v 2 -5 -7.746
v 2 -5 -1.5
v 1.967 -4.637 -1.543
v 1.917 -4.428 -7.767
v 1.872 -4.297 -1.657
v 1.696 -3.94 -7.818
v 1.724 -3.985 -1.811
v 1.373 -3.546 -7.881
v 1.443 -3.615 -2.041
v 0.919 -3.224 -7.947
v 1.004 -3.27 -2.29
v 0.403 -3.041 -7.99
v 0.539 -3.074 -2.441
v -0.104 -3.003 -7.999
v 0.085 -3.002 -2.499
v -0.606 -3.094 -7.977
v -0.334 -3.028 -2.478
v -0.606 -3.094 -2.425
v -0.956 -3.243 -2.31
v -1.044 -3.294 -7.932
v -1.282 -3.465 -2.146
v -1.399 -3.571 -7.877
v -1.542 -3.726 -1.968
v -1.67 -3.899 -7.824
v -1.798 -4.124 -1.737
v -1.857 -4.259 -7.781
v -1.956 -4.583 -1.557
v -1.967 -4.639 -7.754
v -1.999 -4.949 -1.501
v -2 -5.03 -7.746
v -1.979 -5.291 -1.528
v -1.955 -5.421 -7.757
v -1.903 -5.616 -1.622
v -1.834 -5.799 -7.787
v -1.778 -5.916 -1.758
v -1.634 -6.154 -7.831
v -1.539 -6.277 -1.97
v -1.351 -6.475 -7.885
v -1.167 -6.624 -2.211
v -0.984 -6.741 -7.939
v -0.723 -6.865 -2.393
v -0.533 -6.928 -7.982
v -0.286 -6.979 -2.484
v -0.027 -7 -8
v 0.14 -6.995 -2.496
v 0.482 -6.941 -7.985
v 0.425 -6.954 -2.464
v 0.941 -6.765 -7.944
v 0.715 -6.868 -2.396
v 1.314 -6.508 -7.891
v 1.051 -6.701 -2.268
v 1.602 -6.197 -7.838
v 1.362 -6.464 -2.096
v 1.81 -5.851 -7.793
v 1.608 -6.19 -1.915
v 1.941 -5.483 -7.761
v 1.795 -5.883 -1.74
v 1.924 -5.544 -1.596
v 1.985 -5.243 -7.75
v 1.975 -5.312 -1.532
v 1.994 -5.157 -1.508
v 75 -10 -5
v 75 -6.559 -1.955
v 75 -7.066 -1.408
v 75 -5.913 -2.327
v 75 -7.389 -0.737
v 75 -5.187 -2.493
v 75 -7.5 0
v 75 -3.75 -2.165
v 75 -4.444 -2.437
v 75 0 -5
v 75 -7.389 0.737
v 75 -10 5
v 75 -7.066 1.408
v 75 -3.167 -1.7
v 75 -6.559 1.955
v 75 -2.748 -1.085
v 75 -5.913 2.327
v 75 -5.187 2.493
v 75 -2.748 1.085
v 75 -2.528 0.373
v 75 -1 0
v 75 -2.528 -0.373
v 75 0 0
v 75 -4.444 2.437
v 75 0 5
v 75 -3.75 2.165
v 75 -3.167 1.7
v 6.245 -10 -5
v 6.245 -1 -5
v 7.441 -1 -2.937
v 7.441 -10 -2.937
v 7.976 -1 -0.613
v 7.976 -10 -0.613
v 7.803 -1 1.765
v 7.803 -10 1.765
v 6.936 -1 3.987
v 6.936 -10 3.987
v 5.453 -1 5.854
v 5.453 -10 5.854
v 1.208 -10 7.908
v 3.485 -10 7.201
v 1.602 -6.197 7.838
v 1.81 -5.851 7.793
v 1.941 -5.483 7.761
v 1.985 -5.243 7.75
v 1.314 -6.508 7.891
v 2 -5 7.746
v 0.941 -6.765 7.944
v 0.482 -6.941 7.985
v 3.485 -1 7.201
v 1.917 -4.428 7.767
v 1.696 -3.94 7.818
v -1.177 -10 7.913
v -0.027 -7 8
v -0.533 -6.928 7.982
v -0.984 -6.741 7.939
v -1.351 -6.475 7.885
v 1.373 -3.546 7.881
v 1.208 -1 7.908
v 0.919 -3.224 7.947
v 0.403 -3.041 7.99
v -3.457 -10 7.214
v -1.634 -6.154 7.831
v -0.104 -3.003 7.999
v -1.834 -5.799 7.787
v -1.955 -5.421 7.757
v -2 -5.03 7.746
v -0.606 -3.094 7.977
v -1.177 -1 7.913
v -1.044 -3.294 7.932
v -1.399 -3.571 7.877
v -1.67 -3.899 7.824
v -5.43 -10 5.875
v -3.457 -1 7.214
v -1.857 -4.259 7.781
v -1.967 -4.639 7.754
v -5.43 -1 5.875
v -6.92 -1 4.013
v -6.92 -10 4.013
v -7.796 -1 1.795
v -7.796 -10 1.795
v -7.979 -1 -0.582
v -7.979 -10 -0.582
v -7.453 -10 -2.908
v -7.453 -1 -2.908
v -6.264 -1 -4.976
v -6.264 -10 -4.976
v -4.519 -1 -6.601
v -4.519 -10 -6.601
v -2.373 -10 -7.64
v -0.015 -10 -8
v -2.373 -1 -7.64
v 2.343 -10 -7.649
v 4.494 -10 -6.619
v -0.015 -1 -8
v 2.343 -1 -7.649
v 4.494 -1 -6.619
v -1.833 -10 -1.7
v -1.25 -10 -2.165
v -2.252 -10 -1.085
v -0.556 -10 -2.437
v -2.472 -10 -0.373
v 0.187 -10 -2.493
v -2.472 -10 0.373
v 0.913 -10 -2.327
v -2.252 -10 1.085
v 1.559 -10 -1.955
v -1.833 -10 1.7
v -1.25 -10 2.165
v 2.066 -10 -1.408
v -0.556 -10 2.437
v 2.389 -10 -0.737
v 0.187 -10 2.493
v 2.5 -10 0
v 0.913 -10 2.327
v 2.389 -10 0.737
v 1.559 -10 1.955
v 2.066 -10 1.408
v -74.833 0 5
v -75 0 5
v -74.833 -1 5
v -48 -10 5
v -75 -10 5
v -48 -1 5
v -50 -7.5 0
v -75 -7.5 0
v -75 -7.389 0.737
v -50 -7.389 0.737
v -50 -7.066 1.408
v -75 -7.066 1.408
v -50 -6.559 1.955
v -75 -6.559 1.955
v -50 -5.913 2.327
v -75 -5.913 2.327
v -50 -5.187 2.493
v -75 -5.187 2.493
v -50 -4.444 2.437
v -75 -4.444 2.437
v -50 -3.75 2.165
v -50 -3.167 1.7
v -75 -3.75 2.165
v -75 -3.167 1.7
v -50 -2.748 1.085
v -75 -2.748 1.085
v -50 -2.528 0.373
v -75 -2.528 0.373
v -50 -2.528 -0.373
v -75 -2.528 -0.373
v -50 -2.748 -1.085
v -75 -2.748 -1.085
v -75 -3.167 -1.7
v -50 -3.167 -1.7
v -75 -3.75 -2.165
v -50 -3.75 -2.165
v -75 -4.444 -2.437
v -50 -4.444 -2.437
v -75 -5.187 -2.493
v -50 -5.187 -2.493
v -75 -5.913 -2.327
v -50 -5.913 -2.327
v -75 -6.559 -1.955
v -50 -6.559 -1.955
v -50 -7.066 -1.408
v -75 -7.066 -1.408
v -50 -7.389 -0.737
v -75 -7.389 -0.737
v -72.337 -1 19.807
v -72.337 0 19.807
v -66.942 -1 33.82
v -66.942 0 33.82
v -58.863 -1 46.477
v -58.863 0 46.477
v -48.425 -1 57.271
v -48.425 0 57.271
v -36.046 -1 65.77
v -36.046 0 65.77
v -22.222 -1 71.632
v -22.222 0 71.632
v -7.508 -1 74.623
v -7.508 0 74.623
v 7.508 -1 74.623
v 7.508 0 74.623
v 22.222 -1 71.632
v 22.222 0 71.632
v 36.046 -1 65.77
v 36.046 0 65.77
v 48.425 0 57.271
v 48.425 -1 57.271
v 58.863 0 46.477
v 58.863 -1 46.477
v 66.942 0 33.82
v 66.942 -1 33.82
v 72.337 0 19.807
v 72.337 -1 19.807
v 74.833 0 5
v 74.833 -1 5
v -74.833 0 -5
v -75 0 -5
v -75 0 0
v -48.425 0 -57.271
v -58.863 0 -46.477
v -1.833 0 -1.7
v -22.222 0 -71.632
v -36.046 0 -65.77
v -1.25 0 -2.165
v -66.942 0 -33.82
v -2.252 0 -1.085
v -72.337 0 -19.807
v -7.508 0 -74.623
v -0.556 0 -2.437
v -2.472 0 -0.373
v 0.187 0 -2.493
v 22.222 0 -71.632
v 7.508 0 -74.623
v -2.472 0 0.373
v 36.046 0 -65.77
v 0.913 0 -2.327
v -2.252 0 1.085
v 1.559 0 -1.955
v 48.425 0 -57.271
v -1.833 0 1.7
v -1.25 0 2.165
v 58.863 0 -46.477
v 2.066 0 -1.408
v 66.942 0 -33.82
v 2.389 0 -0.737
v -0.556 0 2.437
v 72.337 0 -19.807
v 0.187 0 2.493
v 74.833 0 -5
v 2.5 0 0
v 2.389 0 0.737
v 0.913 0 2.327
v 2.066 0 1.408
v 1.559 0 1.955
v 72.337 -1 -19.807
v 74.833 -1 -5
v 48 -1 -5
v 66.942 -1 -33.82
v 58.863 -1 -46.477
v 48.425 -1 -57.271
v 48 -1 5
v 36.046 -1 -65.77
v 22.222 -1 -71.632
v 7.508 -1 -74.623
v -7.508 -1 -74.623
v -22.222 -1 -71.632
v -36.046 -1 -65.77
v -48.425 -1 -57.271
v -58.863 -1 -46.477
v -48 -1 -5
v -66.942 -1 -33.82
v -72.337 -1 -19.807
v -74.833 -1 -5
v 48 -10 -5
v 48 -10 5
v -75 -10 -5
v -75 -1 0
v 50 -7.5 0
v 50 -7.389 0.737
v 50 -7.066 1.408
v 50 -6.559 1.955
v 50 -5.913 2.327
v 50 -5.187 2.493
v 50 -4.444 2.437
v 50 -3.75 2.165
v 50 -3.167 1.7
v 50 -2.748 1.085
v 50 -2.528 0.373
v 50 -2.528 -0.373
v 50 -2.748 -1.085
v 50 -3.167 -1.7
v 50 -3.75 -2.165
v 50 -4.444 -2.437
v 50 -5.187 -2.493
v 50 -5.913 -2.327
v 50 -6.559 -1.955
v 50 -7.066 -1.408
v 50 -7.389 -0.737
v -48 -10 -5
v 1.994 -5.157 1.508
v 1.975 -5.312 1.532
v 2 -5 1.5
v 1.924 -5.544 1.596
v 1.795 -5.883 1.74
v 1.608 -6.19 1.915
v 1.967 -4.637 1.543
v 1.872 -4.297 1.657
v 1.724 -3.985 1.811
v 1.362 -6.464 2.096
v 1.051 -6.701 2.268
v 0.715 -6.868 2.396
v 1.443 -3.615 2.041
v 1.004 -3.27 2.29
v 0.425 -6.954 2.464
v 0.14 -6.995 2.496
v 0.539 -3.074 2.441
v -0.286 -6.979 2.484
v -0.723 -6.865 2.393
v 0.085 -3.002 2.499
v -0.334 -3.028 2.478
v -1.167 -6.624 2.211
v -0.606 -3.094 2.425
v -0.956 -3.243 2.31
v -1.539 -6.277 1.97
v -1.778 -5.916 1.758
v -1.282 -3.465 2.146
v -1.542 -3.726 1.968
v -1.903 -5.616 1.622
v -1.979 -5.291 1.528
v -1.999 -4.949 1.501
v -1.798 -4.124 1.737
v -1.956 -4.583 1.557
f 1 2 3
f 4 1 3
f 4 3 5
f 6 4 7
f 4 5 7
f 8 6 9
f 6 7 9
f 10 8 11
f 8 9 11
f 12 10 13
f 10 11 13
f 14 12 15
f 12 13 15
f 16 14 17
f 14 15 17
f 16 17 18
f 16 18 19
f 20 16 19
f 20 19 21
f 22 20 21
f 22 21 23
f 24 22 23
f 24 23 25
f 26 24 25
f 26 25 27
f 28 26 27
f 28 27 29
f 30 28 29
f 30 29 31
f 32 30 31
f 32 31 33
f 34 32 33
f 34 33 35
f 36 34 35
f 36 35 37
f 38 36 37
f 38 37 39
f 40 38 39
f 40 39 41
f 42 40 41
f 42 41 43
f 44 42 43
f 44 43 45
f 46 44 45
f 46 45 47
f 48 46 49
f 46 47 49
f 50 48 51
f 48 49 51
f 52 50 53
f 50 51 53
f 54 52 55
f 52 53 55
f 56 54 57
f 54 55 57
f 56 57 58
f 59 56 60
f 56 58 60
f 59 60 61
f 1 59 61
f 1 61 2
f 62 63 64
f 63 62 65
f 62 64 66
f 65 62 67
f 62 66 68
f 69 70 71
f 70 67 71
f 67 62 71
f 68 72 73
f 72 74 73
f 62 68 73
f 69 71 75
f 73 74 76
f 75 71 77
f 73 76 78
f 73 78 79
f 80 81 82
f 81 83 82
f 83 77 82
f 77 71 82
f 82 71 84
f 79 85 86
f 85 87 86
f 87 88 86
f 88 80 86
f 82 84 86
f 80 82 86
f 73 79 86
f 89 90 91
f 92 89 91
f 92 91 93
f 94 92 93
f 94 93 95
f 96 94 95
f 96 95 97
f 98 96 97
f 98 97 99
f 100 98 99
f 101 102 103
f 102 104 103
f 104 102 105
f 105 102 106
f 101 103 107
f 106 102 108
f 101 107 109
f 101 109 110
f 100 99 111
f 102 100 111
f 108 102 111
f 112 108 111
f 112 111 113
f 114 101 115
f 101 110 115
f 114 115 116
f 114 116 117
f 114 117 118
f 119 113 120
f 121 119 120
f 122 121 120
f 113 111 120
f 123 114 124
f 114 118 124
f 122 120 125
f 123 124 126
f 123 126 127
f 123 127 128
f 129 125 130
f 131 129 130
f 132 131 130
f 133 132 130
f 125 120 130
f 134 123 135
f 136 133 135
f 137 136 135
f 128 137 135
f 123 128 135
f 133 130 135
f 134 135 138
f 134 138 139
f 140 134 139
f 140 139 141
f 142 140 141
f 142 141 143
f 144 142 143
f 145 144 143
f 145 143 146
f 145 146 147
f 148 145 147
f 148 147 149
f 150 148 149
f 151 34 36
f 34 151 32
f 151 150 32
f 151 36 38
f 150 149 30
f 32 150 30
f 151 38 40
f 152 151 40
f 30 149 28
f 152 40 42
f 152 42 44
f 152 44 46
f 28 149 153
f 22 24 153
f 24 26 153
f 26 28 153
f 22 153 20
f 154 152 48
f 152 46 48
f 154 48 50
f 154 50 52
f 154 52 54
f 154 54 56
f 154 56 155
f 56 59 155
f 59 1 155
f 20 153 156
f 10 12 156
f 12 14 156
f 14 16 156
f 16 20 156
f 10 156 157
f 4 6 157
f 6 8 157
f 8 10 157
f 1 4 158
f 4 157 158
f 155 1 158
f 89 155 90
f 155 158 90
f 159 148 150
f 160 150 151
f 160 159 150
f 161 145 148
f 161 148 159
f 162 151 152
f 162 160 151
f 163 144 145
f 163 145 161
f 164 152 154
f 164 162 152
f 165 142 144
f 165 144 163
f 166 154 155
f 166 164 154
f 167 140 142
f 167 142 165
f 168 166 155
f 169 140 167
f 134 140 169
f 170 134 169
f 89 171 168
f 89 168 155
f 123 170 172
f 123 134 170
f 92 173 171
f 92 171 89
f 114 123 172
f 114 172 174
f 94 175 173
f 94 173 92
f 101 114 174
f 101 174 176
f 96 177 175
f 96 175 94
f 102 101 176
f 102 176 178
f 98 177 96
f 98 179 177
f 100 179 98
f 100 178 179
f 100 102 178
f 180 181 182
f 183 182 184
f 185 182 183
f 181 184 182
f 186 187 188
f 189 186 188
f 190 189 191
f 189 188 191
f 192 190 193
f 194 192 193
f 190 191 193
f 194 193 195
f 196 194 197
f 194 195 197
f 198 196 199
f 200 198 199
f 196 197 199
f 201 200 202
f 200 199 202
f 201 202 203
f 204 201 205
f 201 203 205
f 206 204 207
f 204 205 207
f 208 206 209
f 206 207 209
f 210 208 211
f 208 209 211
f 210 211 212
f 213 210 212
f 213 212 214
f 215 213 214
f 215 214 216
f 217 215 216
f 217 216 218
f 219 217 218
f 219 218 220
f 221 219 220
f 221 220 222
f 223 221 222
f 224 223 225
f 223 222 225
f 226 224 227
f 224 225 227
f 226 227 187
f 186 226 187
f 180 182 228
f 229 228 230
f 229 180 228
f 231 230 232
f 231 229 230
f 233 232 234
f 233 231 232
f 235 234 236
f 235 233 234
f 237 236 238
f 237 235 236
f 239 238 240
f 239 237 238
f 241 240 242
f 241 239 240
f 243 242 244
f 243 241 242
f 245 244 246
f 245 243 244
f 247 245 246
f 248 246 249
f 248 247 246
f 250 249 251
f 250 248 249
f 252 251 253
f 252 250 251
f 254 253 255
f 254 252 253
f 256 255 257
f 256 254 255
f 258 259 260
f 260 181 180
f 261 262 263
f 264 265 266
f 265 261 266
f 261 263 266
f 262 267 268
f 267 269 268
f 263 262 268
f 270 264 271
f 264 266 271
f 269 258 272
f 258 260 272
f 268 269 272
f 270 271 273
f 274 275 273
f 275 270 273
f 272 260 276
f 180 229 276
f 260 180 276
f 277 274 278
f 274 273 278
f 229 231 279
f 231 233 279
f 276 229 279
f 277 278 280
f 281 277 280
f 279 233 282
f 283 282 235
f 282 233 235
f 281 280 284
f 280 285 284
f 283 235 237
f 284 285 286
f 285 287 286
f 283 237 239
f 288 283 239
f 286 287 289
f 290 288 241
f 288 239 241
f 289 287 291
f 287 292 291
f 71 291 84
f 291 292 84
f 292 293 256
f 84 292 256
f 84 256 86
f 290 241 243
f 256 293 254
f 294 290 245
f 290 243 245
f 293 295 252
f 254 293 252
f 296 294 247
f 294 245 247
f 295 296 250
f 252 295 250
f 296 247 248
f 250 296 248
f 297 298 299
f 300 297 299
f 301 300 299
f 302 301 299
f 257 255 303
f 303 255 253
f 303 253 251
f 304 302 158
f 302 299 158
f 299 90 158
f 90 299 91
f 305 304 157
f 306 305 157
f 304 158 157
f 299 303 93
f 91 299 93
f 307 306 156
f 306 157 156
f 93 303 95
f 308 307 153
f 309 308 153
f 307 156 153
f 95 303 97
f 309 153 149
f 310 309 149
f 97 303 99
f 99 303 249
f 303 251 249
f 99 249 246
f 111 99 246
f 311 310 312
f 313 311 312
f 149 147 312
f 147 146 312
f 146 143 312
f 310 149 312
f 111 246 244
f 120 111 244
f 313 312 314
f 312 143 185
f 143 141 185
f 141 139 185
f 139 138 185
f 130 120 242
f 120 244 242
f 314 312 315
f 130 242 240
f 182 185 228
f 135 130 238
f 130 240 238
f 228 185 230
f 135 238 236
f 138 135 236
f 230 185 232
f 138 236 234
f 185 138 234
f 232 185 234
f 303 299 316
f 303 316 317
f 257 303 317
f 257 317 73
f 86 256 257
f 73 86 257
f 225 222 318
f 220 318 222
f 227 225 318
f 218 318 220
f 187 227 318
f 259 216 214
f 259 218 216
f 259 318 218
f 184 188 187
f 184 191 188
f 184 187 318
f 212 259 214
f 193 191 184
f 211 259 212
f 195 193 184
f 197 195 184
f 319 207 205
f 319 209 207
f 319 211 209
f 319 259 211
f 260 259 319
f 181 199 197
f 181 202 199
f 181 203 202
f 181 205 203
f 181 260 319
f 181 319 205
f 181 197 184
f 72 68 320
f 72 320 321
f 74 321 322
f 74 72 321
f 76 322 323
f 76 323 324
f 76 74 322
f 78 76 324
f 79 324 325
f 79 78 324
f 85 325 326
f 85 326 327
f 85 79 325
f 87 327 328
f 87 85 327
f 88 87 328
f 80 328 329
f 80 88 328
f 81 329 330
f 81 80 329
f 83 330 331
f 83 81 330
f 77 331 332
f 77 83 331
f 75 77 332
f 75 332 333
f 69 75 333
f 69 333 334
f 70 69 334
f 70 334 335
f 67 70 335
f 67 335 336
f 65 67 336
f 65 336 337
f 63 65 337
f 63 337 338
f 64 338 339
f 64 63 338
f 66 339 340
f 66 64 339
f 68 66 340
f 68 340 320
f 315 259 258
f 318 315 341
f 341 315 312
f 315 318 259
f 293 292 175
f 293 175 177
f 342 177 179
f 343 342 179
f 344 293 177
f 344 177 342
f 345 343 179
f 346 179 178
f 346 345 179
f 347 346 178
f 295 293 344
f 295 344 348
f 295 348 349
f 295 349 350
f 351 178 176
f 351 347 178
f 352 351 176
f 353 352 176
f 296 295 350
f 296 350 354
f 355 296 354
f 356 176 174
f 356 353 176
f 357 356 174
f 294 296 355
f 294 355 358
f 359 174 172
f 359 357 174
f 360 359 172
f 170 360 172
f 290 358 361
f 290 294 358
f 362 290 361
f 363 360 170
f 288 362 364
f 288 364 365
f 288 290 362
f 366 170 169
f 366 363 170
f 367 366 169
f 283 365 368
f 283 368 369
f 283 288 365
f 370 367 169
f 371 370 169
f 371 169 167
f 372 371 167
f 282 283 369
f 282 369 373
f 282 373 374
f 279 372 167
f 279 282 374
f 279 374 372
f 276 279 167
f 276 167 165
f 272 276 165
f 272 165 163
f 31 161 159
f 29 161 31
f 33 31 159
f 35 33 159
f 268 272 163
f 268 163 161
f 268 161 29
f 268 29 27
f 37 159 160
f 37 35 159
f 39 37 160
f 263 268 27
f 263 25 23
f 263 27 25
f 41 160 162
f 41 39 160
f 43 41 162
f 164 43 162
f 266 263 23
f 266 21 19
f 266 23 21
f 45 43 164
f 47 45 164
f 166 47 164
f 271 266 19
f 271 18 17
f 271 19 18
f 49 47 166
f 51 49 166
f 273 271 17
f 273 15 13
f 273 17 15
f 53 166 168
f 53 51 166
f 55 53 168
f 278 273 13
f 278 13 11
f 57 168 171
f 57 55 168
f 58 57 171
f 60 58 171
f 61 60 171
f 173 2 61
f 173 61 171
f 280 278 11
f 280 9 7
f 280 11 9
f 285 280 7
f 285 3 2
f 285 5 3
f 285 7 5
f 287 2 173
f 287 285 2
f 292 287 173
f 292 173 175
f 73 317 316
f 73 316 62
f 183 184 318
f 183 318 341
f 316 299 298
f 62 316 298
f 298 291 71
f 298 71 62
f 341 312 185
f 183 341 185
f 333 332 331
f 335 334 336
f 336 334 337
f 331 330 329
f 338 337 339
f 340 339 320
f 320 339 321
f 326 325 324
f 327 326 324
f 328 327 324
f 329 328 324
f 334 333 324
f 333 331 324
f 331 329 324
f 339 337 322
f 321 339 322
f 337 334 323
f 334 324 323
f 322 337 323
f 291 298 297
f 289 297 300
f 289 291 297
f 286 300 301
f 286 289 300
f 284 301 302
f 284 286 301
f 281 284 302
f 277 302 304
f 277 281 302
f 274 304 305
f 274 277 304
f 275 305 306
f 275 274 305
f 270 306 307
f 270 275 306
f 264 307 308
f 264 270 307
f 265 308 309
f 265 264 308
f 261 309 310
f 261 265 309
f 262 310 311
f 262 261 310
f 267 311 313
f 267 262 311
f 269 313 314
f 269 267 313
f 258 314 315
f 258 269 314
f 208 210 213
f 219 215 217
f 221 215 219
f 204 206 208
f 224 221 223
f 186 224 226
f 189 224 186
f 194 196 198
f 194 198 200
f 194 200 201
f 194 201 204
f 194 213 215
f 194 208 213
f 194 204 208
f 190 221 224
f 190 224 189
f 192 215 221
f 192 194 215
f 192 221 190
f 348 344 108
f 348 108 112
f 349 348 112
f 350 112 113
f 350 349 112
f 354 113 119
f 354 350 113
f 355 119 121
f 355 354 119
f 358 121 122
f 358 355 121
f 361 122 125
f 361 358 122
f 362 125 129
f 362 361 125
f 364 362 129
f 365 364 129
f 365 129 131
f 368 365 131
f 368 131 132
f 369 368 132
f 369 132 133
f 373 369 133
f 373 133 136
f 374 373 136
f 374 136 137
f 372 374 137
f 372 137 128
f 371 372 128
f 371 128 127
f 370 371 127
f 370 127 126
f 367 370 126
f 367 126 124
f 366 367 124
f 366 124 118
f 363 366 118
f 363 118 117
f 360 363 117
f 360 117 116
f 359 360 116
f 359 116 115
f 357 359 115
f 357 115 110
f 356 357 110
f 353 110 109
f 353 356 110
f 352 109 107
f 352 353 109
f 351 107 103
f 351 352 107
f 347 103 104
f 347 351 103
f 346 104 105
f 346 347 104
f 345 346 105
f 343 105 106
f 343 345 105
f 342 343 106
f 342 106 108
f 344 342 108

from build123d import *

# Parameters (mm, degrees)
F0_W          = 27
F0_H          = 10
F1_DEPTH      = 10
F0_R          = 2.5
F2_R          = 75
F2_R_2        = 2.5
F3_DEPTH      = 1
F4_R          = 2.5
F5_DEPTH      = 25
F6_R          = 2
F7_DEPTH      = 75.001
F7_DEPTH_BACK = 75.001


# Not quite as in the source:
# - a pattern or mirror of a feature is missing from the dataset's text; its kind, count and spacing are read off the source's solid


with BuildPart() as f1:
    # F0 (on Front) → F1 (new body)
    with BuildSketch(Plane.XZ):
        with Locations((61.5, 0)):
            Rectangle(F0_W, F0_H)
    extrude(amount=F1_DEPTH)



with BuildPart() as f1b:
    # F0 (on Front) → F1, piece 2 (new body)
    with BuildSketch(Plane.XZ):
        with Locations((-61.5, 0)):
            Rectangle(F0_W, F0_H)
    extrude(amount=F1_DEPTH)


with BuildPart() as f1c:
    # F0 (on Front) → F1, piece 3 (new body)
    with BuildSketch(Plane.XZ):
        with BuildLine():
            ThreePointArc((6.2449979984, 5), (0, 8), (-6.2449979984, 5))
            ThreePointArc((-6.2449979984, 5), (-8, 0), (-6.2449979984, -5))
            ThreePointArc((-6.2449979984, -5), (0, -8), (6.2449979984, -5))
            ThreePointArc((6.2449979984, -5), (8, 0), (6.2449979984, 5))
        make_face()
        Circle(F0_R, mode=Mode.SUBTRACT)
    extrude(amount=F1_DEPTH)


with BuildPart() as f1_1:
    add(f1.part)

    add(f1b.part)  # F3 merges F1b

    add(f1c.part)  # F3 merges F1c
    # F2 (on face) → F3 (join)
    with BuildSketch(Plane(origin=(0, 0, 0), x_dir=(-1, 0, 0), z_dir=(0, 1, 0))):
        Circle(F2_R)
        Circle(F2_R_2, mode=Mode.SUBTRACT)
    extrude(amount=-F3_DEPTH)

    # F4 (on face) → F5 (cut)
    with BuildSketch(Plane(origin=(-75, 0, 0), x_dir=(0, -1, 0), z_dir=(-1, 0, 0))):
        with Locations((5, 0)):
            Circle(F4_R)
    f5 = extrude(amount=-F5_DEPTH, mode=Mode.SUBTRACT)

    # F5_copies: F5 across plane
    add(f5.mirror(Plane(origin=(0, 0, 0), x_dir=(0, 0, 1), z_dir=(1, 0, 0))), mode=Mode.SUBTRACT)

    # F6 (on Top) → F7 (cut, two sides)
    with BuildSketch(Plane.XY) as f7_sk:
        with Locations((0, -5)):
            Circle(F6_R)
    extrude(amount=-F7_DEPTH, mode=Mode.SUBTRACT)
    extrude(f7_sk.sketch, amount=F7_DEPTH_BACK, mode=Mode.SUBTRACT)


solid = f1_1.part
